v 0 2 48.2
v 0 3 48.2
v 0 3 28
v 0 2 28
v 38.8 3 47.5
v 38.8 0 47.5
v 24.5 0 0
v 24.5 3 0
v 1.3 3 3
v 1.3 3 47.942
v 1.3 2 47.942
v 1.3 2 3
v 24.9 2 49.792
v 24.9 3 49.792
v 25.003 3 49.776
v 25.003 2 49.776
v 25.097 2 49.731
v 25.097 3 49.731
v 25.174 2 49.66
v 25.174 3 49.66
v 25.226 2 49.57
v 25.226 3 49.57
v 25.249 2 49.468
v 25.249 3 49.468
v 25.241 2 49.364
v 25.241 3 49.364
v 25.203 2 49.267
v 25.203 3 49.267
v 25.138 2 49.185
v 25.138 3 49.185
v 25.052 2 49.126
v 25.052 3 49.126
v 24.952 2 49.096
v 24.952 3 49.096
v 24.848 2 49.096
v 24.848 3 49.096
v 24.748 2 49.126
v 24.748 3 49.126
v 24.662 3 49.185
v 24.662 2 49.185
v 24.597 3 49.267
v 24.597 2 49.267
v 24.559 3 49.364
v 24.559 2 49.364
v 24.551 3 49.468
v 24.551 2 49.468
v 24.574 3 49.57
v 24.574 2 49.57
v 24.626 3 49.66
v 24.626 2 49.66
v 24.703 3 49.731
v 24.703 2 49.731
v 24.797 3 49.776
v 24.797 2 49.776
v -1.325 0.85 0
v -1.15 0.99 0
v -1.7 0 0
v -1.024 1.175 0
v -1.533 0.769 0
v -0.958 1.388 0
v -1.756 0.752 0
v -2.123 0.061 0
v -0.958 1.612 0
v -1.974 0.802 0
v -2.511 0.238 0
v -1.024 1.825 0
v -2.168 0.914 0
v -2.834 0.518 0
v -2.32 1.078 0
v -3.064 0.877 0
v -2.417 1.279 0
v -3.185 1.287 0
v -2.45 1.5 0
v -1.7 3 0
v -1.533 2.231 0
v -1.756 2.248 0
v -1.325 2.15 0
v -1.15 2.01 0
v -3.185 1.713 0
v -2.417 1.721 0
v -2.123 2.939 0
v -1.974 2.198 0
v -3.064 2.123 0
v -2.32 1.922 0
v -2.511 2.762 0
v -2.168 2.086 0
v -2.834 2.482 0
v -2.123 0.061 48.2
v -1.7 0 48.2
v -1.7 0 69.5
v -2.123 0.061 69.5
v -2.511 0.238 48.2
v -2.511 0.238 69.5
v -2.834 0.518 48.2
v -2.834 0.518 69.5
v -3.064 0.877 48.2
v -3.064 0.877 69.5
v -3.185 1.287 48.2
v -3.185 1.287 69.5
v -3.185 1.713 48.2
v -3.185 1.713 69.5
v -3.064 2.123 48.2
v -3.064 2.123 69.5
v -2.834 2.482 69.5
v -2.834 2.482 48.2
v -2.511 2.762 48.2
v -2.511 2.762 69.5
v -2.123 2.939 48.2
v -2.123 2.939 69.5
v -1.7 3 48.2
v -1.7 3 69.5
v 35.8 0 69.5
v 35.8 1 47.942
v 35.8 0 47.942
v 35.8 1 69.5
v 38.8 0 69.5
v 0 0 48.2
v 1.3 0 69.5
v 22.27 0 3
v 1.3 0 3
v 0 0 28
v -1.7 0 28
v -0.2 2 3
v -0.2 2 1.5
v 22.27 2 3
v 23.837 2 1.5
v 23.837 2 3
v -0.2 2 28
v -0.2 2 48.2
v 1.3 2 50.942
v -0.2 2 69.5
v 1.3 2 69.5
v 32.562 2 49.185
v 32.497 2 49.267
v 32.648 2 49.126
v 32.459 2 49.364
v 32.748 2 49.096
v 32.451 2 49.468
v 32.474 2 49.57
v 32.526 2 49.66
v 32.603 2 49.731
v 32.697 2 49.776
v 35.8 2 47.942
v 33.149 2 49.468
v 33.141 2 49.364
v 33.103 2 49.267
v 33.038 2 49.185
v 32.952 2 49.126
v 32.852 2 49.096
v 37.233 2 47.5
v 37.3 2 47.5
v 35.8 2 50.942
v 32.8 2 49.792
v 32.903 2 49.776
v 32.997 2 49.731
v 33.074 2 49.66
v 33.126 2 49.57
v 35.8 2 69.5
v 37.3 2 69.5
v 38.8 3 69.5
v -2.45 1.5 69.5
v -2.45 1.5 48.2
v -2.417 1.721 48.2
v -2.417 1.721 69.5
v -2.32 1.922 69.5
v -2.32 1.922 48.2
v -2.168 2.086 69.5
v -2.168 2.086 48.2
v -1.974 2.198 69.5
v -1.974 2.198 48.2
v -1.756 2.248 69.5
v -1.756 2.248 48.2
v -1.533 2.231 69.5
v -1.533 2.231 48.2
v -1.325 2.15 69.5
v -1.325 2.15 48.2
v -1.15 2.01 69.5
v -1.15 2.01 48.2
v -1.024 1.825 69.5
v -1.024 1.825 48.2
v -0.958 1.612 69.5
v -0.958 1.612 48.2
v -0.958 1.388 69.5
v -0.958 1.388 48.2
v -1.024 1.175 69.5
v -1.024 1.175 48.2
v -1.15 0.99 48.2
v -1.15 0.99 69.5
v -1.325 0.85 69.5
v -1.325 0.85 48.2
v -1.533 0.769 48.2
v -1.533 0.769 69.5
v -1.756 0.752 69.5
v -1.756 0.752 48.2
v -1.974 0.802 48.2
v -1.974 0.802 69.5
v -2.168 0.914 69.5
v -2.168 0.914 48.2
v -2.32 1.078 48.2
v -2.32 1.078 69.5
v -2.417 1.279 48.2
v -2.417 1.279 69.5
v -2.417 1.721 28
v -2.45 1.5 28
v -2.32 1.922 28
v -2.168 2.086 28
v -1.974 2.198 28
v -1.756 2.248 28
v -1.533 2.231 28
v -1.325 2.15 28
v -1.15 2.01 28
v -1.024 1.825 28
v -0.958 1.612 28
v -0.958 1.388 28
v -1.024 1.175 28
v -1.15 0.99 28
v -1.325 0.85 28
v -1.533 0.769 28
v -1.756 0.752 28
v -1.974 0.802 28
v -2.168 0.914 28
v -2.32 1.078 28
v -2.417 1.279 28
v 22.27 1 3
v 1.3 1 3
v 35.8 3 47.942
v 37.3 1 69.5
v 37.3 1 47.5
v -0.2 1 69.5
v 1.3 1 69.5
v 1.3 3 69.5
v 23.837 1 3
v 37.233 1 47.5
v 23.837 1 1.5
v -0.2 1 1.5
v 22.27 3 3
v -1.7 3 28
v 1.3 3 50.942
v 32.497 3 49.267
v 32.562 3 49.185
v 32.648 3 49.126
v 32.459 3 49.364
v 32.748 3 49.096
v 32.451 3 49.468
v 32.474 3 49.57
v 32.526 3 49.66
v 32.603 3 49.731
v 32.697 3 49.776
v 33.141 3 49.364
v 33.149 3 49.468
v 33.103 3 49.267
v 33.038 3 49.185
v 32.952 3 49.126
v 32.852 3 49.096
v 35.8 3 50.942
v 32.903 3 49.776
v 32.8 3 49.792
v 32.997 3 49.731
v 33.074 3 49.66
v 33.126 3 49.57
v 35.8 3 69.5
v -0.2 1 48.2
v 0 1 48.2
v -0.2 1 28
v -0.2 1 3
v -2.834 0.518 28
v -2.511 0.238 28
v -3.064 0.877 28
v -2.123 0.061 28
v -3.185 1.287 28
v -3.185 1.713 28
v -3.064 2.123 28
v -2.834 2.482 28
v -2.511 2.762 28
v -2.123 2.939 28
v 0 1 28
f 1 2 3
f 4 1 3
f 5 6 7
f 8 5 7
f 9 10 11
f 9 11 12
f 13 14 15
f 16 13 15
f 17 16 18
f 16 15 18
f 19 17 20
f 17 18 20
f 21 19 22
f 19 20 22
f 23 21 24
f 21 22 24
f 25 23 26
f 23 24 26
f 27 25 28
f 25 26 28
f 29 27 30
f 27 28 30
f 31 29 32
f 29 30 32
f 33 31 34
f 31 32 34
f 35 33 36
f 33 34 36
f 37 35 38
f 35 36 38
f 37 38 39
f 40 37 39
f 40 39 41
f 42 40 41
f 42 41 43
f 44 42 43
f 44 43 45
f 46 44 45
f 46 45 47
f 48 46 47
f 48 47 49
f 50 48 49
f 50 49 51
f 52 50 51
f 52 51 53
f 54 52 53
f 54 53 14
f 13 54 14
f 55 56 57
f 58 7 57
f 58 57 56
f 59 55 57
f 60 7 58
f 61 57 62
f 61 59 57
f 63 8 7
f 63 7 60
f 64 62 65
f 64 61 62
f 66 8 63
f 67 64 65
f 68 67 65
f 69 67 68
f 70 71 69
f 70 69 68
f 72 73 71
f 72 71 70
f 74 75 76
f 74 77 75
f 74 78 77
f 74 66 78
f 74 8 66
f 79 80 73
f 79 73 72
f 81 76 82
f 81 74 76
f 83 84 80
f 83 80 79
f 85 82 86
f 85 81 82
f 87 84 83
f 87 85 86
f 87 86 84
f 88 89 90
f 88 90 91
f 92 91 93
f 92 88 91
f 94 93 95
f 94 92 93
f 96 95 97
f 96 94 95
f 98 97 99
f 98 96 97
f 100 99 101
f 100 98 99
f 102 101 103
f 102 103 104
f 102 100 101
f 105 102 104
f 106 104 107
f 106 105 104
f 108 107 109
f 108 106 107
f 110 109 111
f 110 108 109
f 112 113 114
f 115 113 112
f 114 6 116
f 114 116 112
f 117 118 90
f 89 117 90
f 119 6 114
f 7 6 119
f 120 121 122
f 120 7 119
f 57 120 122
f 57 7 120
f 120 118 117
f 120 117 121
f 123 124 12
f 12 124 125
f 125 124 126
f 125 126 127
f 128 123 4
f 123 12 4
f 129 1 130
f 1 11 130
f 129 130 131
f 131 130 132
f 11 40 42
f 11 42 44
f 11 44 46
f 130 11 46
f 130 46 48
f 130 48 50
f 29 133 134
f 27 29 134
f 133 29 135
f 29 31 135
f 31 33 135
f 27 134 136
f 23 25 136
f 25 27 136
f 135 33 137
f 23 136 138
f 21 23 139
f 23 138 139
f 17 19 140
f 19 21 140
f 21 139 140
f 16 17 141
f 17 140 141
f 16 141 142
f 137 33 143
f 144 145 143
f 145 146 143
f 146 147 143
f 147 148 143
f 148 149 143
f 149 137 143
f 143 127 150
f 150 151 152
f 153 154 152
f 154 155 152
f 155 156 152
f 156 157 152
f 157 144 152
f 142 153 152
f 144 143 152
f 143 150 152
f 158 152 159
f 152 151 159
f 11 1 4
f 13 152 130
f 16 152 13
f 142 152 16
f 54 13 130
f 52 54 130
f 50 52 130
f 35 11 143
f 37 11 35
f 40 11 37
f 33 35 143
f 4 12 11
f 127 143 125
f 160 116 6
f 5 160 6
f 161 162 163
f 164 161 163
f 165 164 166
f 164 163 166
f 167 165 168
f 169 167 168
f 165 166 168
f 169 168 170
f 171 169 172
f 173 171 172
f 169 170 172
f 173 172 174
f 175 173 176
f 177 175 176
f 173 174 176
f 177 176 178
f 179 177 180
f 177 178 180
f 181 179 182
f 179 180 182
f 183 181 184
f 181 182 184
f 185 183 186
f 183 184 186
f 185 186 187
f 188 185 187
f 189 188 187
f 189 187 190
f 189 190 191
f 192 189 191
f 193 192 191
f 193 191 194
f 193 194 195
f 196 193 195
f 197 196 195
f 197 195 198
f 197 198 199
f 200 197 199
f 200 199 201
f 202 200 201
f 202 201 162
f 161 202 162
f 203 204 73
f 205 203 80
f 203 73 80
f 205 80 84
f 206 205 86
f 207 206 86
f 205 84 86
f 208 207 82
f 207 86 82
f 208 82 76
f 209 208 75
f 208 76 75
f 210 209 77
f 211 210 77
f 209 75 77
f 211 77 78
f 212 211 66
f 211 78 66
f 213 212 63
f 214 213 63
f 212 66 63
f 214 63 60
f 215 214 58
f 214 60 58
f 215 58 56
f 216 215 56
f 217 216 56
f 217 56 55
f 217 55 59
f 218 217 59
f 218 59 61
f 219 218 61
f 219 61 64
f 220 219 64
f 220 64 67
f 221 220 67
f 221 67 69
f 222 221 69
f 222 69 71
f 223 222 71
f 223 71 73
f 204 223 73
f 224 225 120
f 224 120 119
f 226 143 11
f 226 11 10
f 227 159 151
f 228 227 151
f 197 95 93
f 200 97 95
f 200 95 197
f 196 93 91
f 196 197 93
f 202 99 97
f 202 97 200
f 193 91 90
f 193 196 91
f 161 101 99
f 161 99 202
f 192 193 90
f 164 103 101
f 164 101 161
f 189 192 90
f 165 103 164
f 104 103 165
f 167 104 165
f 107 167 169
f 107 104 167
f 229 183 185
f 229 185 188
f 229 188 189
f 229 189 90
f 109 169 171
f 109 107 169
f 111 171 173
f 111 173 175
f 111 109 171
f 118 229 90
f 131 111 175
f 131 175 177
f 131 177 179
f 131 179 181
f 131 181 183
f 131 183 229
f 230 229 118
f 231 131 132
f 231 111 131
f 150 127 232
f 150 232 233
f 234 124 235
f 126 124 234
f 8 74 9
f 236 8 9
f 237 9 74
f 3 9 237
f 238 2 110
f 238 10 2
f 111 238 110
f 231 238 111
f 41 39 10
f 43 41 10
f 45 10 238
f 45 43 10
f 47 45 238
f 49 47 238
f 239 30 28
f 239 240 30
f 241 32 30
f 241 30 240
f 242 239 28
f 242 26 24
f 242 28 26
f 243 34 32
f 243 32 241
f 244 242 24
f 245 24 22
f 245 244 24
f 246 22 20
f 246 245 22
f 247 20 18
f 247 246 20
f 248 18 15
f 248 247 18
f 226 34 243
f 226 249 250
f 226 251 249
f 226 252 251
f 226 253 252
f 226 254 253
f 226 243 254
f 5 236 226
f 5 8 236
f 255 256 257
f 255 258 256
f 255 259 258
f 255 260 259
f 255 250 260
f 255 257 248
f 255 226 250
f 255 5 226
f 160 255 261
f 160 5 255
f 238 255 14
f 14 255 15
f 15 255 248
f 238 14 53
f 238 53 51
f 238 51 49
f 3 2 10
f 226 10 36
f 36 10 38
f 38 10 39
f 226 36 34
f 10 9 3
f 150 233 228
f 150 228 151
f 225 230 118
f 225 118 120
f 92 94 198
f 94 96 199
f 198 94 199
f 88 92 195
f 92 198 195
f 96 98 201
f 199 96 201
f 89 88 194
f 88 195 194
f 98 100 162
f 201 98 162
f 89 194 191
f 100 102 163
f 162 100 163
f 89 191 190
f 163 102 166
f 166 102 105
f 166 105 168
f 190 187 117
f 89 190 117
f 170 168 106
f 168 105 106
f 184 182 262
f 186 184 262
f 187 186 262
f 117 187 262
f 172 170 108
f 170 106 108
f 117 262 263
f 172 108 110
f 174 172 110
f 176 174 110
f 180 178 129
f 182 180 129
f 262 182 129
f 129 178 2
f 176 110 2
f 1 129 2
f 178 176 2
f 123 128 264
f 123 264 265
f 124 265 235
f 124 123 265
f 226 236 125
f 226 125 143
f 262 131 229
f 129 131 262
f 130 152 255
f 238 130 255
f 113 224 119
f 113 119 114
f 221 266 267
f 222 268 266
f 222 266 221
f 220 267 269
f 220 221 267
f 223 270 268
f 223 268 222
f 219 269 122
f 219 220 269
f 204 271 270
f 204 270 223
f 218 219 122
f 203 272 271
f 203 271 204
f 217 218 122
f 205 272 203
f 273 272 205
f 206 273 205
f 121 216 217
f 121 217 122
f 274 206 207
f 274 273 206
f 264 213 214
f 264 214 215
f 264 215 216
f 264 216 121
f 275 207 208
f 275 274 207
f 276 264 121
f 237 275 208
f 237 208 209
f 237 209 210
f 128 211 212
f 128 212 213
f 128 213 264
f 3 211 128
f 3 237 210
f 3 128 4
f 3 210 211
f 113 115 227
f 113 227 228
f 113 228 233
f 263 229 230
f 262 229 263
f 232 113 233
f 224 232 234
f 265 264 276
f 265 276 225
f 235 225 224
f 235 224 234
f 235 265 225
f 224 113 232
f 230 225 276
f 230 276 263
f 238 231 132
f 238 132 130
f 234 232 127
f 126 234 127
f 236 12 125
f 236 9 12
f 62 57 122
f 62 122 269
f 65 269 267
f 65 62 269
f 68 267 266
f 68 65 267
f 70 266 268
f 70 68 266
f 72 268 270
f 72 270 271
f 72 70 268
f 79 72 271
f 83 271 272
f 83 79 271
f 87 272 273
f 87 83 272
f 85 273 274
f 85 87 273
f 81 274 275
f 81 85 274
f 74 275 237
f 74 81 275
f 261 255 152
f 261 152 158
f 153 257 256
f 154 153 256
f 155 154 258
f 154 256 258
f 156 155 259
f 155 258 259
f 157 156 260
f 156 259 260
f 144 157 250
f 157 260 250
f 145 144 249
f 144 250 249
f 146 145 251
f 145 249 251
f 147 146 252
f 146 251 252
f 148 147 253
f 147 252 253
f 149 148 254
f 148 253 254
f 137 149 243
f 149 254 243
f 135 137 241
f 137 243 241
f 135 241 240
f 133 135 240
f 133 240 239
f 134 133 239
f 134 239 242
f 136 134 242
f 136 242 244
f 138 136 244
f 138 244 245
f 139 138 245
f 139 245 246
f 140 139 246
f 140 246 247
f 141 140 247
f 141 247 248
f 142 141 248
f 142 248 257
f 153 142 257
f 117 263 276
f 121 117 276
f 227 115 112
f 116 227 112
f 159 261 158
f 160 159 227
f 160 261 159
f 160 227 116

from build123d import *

# Parameters (mm, degrees)
EXTRUDE_1_DEPTH                   = 3
SKETCH_2_R                        = 1.5
SKETCH_2_R_2                      = 0.75
EXTRUDE_2_DEPTH                   = 73
SKETCH_3_W                        = 42
SKETCH_3_H                        = 3.5
SKETCH_3_W_2                      = 3.2
SKETCH_3_H_2                      = 20.2
CUT_EXTRUDE_1_DEPTH               = 83.725086884
CUT_EXTRUDE_2_REACH               = 84.028
CUT_EXTRUDE_2_OFFSET_FROM_SURFACE = 1.5
CUT_EXTRUDE_START                 = -1.5
SKETCH_4_W                        = 44.5
SKETCH_4_H                        = 1
SKETCH_4_3_W                      = 22
SKETCH_4_3_H                      = 1
CUT_EXTRUDE_3_DEPTH               = 37.5
SKETCH_5_W                        = 3
SKETCH_5_H                        = 1
EXTRUDE_3_DEPTH                   = 34.5
SKETCH_6_R                        = 0.35
CUT_EXTRUDE_4_DEPTH               = 80.653562381
SKETCH_7_W                        = 24.036657481
SKETCH_7_H                        = 1
CUT_EXTRUDE_5_DEPTH               = 1.5


with BuildPart() as part:
    # 草图1 → 凸台-拉伸1 (new body)
    with BuildSketch(Plane(origin=(0, 0, 0), x_dir=(1, 0, 0), z_dir=(0, 1, 0))):
        Polygon((0, 0), (0, -73), (38.8, -73), (38.8, -47.5), (24.5, 0), align=None)
    extrude(amount=EXTRUDE_1_DEPTH)

    # 草图2 → 凸台-拉伸2 (add)
    # profile 1 of 2: a face of its own
    with BuildSketch(Plane(origin=(0, 0, 0), x_dir=(-1, 0, 0), z_dir=(0, 0, -1))):
        with BuildLine():
            Line((0, 3), (0, 0))
            Line((0, 0), (1.7, 0))
            ThreePointArc((1.7, 0), (0.2, 1.5), (1.7, 3))
            Line((1.7, 3), (0, 3))
        make_face()
    # profile 2 of 2: a face of its own
    with BuildSketch(Plane(origin=(0, 0, 0), x_dir=(-1, 0, 0), z_dir=(0, 0, -1))):
        with Locations((1.7, 1.5)):
            Circle(SKETCH_2_R)
        with Locations((1.7, 1.5)):
            Circle(SKETCH_2_R_2, mode=Mode.SUBTRACT)
    extrude(amount=-EXTRUDE_2_DEPTH)

    # 草图3 → 切除-拉伸1 (cut, through all)
    with BuildSketch(Plane(origin=(0, 3, 0), x_dir=(1, 0, 0), z_dir=(0, 1, 0))):
        with Locations((17.8, -71.25)):
            Rectangle(SKETCH_3_W, SKETCH_3_H)
        with Locations((-1.6, -38.1)):
            Rectangle(SKETCH_3_W_2, SKETCH_3_H_2)
        Polygon((1.3, -3), (22.270157068, -3), (35.8, -47.941785964), (35.8, -69.5), (1.3, -69.5), align=None)
    extrude(amount=-CUT_EXTRUDE_1_DEPTH, mode=Mode.SUBTRACT)

    # 切除-拉伸2: up to this face of the body (flat: up to its plane, moved by the offset)
    cut_extrude_2_end = Plane(part.part.faces().sort_by_distance((29.035078534, 1.5, 25.470892982))[0]).offset(-CUT_EXTRUDE_2_OFFSET_FROM_SURFACE)
    # 草图4 → 切除-拉伸2 (cut, up to the picked face)
    with BuildSketch(Plane(origin=(1.3, 0, 0), x_dir=(0, 0, -1), z_dir=(1, 0, 0)).offset(CUT_EXTRUDE_START), mode=Mode.PRIVATE) as cut_extrude_2_sk1:
        with Locations((-25.25, 1.5)):
            Rectangle(SKETCH_4_W, SKETCH_4_H)
    cut_extrude_2_tool1 = split(extrude(cut_extrude_2_sk1.sketch, amount=CUT_EXTRUDE_2_REACH, mode=Mode.PRIVATE), bisect_by=cut_extrude_2_end, keep=Keep.BOTH, mode=Mode.PRIVATE)
    add(cut_extrude_2_tool1.solids().sort_by(Axis((-0.2, 1.5, 25.25), (1, 0, 0)))[0], mode=Mode.SUBTRACT)

    # 草图4<3> → 切除-拉伸3 (cut)
    with BuildSketch(Plane(origin=(1.3, 0, 0), x_dir=(0, 0, -1), z_dir=(1, 0, 0)).offset(CUT_EXTRUDE_START)):
        with Locations((-58.5, 1.5)):
            Rectangle(SKETCH_4_3_W, SKETCH_4_3_H)
    extrude(amount=CUT_EXTRUDE_3_DEPTH, mode=Mode.SUBTRACT)

    # 草图5 → 凸台-拉伸3 (add)
    with BuildSketch(Plane.ZY.offset(-35.8)):
        with Locations((49.441785964, 2.5)):
            Rectangle(SKETCH_5_W, SKETCH_5_H)
    extrude(amount=EXTRUDE_3_DEPTH)

    # 草图6 → 切除-拉伸4 (cut, through all)
    with BuildSketch(Plane(origin=(0, 3, 0), x_dir=(1, 0, 0), z_dir=(0, 1, 0))):
        with Locations(Location((32.8, -49.441785964, 0), (0, 0, 270))):
            Circle(SKETCH_6_R)
        with Locations(Location((24.9, -49.441785964, 0), (0, 0, 270))):
            Circle(SKETCH_6_R)
    extrude(amount=-CUT_EXTRUDE_4_DEPTH, mode=Mode.SUBTRACT)

    # 草图7 → 切除-拉伸5 (cut)
    with BuildSketch(Plane.XY.offset(3)):
        with Locations((11.818328741, 1.5)):
            Rectangle(SKETCH_7_W, SKETCH_7_H)
    extrude(amount=-CUT_EXTRUDE_5_DEPTH, mode=Mode.SUBTRACT)


solid = part.part
